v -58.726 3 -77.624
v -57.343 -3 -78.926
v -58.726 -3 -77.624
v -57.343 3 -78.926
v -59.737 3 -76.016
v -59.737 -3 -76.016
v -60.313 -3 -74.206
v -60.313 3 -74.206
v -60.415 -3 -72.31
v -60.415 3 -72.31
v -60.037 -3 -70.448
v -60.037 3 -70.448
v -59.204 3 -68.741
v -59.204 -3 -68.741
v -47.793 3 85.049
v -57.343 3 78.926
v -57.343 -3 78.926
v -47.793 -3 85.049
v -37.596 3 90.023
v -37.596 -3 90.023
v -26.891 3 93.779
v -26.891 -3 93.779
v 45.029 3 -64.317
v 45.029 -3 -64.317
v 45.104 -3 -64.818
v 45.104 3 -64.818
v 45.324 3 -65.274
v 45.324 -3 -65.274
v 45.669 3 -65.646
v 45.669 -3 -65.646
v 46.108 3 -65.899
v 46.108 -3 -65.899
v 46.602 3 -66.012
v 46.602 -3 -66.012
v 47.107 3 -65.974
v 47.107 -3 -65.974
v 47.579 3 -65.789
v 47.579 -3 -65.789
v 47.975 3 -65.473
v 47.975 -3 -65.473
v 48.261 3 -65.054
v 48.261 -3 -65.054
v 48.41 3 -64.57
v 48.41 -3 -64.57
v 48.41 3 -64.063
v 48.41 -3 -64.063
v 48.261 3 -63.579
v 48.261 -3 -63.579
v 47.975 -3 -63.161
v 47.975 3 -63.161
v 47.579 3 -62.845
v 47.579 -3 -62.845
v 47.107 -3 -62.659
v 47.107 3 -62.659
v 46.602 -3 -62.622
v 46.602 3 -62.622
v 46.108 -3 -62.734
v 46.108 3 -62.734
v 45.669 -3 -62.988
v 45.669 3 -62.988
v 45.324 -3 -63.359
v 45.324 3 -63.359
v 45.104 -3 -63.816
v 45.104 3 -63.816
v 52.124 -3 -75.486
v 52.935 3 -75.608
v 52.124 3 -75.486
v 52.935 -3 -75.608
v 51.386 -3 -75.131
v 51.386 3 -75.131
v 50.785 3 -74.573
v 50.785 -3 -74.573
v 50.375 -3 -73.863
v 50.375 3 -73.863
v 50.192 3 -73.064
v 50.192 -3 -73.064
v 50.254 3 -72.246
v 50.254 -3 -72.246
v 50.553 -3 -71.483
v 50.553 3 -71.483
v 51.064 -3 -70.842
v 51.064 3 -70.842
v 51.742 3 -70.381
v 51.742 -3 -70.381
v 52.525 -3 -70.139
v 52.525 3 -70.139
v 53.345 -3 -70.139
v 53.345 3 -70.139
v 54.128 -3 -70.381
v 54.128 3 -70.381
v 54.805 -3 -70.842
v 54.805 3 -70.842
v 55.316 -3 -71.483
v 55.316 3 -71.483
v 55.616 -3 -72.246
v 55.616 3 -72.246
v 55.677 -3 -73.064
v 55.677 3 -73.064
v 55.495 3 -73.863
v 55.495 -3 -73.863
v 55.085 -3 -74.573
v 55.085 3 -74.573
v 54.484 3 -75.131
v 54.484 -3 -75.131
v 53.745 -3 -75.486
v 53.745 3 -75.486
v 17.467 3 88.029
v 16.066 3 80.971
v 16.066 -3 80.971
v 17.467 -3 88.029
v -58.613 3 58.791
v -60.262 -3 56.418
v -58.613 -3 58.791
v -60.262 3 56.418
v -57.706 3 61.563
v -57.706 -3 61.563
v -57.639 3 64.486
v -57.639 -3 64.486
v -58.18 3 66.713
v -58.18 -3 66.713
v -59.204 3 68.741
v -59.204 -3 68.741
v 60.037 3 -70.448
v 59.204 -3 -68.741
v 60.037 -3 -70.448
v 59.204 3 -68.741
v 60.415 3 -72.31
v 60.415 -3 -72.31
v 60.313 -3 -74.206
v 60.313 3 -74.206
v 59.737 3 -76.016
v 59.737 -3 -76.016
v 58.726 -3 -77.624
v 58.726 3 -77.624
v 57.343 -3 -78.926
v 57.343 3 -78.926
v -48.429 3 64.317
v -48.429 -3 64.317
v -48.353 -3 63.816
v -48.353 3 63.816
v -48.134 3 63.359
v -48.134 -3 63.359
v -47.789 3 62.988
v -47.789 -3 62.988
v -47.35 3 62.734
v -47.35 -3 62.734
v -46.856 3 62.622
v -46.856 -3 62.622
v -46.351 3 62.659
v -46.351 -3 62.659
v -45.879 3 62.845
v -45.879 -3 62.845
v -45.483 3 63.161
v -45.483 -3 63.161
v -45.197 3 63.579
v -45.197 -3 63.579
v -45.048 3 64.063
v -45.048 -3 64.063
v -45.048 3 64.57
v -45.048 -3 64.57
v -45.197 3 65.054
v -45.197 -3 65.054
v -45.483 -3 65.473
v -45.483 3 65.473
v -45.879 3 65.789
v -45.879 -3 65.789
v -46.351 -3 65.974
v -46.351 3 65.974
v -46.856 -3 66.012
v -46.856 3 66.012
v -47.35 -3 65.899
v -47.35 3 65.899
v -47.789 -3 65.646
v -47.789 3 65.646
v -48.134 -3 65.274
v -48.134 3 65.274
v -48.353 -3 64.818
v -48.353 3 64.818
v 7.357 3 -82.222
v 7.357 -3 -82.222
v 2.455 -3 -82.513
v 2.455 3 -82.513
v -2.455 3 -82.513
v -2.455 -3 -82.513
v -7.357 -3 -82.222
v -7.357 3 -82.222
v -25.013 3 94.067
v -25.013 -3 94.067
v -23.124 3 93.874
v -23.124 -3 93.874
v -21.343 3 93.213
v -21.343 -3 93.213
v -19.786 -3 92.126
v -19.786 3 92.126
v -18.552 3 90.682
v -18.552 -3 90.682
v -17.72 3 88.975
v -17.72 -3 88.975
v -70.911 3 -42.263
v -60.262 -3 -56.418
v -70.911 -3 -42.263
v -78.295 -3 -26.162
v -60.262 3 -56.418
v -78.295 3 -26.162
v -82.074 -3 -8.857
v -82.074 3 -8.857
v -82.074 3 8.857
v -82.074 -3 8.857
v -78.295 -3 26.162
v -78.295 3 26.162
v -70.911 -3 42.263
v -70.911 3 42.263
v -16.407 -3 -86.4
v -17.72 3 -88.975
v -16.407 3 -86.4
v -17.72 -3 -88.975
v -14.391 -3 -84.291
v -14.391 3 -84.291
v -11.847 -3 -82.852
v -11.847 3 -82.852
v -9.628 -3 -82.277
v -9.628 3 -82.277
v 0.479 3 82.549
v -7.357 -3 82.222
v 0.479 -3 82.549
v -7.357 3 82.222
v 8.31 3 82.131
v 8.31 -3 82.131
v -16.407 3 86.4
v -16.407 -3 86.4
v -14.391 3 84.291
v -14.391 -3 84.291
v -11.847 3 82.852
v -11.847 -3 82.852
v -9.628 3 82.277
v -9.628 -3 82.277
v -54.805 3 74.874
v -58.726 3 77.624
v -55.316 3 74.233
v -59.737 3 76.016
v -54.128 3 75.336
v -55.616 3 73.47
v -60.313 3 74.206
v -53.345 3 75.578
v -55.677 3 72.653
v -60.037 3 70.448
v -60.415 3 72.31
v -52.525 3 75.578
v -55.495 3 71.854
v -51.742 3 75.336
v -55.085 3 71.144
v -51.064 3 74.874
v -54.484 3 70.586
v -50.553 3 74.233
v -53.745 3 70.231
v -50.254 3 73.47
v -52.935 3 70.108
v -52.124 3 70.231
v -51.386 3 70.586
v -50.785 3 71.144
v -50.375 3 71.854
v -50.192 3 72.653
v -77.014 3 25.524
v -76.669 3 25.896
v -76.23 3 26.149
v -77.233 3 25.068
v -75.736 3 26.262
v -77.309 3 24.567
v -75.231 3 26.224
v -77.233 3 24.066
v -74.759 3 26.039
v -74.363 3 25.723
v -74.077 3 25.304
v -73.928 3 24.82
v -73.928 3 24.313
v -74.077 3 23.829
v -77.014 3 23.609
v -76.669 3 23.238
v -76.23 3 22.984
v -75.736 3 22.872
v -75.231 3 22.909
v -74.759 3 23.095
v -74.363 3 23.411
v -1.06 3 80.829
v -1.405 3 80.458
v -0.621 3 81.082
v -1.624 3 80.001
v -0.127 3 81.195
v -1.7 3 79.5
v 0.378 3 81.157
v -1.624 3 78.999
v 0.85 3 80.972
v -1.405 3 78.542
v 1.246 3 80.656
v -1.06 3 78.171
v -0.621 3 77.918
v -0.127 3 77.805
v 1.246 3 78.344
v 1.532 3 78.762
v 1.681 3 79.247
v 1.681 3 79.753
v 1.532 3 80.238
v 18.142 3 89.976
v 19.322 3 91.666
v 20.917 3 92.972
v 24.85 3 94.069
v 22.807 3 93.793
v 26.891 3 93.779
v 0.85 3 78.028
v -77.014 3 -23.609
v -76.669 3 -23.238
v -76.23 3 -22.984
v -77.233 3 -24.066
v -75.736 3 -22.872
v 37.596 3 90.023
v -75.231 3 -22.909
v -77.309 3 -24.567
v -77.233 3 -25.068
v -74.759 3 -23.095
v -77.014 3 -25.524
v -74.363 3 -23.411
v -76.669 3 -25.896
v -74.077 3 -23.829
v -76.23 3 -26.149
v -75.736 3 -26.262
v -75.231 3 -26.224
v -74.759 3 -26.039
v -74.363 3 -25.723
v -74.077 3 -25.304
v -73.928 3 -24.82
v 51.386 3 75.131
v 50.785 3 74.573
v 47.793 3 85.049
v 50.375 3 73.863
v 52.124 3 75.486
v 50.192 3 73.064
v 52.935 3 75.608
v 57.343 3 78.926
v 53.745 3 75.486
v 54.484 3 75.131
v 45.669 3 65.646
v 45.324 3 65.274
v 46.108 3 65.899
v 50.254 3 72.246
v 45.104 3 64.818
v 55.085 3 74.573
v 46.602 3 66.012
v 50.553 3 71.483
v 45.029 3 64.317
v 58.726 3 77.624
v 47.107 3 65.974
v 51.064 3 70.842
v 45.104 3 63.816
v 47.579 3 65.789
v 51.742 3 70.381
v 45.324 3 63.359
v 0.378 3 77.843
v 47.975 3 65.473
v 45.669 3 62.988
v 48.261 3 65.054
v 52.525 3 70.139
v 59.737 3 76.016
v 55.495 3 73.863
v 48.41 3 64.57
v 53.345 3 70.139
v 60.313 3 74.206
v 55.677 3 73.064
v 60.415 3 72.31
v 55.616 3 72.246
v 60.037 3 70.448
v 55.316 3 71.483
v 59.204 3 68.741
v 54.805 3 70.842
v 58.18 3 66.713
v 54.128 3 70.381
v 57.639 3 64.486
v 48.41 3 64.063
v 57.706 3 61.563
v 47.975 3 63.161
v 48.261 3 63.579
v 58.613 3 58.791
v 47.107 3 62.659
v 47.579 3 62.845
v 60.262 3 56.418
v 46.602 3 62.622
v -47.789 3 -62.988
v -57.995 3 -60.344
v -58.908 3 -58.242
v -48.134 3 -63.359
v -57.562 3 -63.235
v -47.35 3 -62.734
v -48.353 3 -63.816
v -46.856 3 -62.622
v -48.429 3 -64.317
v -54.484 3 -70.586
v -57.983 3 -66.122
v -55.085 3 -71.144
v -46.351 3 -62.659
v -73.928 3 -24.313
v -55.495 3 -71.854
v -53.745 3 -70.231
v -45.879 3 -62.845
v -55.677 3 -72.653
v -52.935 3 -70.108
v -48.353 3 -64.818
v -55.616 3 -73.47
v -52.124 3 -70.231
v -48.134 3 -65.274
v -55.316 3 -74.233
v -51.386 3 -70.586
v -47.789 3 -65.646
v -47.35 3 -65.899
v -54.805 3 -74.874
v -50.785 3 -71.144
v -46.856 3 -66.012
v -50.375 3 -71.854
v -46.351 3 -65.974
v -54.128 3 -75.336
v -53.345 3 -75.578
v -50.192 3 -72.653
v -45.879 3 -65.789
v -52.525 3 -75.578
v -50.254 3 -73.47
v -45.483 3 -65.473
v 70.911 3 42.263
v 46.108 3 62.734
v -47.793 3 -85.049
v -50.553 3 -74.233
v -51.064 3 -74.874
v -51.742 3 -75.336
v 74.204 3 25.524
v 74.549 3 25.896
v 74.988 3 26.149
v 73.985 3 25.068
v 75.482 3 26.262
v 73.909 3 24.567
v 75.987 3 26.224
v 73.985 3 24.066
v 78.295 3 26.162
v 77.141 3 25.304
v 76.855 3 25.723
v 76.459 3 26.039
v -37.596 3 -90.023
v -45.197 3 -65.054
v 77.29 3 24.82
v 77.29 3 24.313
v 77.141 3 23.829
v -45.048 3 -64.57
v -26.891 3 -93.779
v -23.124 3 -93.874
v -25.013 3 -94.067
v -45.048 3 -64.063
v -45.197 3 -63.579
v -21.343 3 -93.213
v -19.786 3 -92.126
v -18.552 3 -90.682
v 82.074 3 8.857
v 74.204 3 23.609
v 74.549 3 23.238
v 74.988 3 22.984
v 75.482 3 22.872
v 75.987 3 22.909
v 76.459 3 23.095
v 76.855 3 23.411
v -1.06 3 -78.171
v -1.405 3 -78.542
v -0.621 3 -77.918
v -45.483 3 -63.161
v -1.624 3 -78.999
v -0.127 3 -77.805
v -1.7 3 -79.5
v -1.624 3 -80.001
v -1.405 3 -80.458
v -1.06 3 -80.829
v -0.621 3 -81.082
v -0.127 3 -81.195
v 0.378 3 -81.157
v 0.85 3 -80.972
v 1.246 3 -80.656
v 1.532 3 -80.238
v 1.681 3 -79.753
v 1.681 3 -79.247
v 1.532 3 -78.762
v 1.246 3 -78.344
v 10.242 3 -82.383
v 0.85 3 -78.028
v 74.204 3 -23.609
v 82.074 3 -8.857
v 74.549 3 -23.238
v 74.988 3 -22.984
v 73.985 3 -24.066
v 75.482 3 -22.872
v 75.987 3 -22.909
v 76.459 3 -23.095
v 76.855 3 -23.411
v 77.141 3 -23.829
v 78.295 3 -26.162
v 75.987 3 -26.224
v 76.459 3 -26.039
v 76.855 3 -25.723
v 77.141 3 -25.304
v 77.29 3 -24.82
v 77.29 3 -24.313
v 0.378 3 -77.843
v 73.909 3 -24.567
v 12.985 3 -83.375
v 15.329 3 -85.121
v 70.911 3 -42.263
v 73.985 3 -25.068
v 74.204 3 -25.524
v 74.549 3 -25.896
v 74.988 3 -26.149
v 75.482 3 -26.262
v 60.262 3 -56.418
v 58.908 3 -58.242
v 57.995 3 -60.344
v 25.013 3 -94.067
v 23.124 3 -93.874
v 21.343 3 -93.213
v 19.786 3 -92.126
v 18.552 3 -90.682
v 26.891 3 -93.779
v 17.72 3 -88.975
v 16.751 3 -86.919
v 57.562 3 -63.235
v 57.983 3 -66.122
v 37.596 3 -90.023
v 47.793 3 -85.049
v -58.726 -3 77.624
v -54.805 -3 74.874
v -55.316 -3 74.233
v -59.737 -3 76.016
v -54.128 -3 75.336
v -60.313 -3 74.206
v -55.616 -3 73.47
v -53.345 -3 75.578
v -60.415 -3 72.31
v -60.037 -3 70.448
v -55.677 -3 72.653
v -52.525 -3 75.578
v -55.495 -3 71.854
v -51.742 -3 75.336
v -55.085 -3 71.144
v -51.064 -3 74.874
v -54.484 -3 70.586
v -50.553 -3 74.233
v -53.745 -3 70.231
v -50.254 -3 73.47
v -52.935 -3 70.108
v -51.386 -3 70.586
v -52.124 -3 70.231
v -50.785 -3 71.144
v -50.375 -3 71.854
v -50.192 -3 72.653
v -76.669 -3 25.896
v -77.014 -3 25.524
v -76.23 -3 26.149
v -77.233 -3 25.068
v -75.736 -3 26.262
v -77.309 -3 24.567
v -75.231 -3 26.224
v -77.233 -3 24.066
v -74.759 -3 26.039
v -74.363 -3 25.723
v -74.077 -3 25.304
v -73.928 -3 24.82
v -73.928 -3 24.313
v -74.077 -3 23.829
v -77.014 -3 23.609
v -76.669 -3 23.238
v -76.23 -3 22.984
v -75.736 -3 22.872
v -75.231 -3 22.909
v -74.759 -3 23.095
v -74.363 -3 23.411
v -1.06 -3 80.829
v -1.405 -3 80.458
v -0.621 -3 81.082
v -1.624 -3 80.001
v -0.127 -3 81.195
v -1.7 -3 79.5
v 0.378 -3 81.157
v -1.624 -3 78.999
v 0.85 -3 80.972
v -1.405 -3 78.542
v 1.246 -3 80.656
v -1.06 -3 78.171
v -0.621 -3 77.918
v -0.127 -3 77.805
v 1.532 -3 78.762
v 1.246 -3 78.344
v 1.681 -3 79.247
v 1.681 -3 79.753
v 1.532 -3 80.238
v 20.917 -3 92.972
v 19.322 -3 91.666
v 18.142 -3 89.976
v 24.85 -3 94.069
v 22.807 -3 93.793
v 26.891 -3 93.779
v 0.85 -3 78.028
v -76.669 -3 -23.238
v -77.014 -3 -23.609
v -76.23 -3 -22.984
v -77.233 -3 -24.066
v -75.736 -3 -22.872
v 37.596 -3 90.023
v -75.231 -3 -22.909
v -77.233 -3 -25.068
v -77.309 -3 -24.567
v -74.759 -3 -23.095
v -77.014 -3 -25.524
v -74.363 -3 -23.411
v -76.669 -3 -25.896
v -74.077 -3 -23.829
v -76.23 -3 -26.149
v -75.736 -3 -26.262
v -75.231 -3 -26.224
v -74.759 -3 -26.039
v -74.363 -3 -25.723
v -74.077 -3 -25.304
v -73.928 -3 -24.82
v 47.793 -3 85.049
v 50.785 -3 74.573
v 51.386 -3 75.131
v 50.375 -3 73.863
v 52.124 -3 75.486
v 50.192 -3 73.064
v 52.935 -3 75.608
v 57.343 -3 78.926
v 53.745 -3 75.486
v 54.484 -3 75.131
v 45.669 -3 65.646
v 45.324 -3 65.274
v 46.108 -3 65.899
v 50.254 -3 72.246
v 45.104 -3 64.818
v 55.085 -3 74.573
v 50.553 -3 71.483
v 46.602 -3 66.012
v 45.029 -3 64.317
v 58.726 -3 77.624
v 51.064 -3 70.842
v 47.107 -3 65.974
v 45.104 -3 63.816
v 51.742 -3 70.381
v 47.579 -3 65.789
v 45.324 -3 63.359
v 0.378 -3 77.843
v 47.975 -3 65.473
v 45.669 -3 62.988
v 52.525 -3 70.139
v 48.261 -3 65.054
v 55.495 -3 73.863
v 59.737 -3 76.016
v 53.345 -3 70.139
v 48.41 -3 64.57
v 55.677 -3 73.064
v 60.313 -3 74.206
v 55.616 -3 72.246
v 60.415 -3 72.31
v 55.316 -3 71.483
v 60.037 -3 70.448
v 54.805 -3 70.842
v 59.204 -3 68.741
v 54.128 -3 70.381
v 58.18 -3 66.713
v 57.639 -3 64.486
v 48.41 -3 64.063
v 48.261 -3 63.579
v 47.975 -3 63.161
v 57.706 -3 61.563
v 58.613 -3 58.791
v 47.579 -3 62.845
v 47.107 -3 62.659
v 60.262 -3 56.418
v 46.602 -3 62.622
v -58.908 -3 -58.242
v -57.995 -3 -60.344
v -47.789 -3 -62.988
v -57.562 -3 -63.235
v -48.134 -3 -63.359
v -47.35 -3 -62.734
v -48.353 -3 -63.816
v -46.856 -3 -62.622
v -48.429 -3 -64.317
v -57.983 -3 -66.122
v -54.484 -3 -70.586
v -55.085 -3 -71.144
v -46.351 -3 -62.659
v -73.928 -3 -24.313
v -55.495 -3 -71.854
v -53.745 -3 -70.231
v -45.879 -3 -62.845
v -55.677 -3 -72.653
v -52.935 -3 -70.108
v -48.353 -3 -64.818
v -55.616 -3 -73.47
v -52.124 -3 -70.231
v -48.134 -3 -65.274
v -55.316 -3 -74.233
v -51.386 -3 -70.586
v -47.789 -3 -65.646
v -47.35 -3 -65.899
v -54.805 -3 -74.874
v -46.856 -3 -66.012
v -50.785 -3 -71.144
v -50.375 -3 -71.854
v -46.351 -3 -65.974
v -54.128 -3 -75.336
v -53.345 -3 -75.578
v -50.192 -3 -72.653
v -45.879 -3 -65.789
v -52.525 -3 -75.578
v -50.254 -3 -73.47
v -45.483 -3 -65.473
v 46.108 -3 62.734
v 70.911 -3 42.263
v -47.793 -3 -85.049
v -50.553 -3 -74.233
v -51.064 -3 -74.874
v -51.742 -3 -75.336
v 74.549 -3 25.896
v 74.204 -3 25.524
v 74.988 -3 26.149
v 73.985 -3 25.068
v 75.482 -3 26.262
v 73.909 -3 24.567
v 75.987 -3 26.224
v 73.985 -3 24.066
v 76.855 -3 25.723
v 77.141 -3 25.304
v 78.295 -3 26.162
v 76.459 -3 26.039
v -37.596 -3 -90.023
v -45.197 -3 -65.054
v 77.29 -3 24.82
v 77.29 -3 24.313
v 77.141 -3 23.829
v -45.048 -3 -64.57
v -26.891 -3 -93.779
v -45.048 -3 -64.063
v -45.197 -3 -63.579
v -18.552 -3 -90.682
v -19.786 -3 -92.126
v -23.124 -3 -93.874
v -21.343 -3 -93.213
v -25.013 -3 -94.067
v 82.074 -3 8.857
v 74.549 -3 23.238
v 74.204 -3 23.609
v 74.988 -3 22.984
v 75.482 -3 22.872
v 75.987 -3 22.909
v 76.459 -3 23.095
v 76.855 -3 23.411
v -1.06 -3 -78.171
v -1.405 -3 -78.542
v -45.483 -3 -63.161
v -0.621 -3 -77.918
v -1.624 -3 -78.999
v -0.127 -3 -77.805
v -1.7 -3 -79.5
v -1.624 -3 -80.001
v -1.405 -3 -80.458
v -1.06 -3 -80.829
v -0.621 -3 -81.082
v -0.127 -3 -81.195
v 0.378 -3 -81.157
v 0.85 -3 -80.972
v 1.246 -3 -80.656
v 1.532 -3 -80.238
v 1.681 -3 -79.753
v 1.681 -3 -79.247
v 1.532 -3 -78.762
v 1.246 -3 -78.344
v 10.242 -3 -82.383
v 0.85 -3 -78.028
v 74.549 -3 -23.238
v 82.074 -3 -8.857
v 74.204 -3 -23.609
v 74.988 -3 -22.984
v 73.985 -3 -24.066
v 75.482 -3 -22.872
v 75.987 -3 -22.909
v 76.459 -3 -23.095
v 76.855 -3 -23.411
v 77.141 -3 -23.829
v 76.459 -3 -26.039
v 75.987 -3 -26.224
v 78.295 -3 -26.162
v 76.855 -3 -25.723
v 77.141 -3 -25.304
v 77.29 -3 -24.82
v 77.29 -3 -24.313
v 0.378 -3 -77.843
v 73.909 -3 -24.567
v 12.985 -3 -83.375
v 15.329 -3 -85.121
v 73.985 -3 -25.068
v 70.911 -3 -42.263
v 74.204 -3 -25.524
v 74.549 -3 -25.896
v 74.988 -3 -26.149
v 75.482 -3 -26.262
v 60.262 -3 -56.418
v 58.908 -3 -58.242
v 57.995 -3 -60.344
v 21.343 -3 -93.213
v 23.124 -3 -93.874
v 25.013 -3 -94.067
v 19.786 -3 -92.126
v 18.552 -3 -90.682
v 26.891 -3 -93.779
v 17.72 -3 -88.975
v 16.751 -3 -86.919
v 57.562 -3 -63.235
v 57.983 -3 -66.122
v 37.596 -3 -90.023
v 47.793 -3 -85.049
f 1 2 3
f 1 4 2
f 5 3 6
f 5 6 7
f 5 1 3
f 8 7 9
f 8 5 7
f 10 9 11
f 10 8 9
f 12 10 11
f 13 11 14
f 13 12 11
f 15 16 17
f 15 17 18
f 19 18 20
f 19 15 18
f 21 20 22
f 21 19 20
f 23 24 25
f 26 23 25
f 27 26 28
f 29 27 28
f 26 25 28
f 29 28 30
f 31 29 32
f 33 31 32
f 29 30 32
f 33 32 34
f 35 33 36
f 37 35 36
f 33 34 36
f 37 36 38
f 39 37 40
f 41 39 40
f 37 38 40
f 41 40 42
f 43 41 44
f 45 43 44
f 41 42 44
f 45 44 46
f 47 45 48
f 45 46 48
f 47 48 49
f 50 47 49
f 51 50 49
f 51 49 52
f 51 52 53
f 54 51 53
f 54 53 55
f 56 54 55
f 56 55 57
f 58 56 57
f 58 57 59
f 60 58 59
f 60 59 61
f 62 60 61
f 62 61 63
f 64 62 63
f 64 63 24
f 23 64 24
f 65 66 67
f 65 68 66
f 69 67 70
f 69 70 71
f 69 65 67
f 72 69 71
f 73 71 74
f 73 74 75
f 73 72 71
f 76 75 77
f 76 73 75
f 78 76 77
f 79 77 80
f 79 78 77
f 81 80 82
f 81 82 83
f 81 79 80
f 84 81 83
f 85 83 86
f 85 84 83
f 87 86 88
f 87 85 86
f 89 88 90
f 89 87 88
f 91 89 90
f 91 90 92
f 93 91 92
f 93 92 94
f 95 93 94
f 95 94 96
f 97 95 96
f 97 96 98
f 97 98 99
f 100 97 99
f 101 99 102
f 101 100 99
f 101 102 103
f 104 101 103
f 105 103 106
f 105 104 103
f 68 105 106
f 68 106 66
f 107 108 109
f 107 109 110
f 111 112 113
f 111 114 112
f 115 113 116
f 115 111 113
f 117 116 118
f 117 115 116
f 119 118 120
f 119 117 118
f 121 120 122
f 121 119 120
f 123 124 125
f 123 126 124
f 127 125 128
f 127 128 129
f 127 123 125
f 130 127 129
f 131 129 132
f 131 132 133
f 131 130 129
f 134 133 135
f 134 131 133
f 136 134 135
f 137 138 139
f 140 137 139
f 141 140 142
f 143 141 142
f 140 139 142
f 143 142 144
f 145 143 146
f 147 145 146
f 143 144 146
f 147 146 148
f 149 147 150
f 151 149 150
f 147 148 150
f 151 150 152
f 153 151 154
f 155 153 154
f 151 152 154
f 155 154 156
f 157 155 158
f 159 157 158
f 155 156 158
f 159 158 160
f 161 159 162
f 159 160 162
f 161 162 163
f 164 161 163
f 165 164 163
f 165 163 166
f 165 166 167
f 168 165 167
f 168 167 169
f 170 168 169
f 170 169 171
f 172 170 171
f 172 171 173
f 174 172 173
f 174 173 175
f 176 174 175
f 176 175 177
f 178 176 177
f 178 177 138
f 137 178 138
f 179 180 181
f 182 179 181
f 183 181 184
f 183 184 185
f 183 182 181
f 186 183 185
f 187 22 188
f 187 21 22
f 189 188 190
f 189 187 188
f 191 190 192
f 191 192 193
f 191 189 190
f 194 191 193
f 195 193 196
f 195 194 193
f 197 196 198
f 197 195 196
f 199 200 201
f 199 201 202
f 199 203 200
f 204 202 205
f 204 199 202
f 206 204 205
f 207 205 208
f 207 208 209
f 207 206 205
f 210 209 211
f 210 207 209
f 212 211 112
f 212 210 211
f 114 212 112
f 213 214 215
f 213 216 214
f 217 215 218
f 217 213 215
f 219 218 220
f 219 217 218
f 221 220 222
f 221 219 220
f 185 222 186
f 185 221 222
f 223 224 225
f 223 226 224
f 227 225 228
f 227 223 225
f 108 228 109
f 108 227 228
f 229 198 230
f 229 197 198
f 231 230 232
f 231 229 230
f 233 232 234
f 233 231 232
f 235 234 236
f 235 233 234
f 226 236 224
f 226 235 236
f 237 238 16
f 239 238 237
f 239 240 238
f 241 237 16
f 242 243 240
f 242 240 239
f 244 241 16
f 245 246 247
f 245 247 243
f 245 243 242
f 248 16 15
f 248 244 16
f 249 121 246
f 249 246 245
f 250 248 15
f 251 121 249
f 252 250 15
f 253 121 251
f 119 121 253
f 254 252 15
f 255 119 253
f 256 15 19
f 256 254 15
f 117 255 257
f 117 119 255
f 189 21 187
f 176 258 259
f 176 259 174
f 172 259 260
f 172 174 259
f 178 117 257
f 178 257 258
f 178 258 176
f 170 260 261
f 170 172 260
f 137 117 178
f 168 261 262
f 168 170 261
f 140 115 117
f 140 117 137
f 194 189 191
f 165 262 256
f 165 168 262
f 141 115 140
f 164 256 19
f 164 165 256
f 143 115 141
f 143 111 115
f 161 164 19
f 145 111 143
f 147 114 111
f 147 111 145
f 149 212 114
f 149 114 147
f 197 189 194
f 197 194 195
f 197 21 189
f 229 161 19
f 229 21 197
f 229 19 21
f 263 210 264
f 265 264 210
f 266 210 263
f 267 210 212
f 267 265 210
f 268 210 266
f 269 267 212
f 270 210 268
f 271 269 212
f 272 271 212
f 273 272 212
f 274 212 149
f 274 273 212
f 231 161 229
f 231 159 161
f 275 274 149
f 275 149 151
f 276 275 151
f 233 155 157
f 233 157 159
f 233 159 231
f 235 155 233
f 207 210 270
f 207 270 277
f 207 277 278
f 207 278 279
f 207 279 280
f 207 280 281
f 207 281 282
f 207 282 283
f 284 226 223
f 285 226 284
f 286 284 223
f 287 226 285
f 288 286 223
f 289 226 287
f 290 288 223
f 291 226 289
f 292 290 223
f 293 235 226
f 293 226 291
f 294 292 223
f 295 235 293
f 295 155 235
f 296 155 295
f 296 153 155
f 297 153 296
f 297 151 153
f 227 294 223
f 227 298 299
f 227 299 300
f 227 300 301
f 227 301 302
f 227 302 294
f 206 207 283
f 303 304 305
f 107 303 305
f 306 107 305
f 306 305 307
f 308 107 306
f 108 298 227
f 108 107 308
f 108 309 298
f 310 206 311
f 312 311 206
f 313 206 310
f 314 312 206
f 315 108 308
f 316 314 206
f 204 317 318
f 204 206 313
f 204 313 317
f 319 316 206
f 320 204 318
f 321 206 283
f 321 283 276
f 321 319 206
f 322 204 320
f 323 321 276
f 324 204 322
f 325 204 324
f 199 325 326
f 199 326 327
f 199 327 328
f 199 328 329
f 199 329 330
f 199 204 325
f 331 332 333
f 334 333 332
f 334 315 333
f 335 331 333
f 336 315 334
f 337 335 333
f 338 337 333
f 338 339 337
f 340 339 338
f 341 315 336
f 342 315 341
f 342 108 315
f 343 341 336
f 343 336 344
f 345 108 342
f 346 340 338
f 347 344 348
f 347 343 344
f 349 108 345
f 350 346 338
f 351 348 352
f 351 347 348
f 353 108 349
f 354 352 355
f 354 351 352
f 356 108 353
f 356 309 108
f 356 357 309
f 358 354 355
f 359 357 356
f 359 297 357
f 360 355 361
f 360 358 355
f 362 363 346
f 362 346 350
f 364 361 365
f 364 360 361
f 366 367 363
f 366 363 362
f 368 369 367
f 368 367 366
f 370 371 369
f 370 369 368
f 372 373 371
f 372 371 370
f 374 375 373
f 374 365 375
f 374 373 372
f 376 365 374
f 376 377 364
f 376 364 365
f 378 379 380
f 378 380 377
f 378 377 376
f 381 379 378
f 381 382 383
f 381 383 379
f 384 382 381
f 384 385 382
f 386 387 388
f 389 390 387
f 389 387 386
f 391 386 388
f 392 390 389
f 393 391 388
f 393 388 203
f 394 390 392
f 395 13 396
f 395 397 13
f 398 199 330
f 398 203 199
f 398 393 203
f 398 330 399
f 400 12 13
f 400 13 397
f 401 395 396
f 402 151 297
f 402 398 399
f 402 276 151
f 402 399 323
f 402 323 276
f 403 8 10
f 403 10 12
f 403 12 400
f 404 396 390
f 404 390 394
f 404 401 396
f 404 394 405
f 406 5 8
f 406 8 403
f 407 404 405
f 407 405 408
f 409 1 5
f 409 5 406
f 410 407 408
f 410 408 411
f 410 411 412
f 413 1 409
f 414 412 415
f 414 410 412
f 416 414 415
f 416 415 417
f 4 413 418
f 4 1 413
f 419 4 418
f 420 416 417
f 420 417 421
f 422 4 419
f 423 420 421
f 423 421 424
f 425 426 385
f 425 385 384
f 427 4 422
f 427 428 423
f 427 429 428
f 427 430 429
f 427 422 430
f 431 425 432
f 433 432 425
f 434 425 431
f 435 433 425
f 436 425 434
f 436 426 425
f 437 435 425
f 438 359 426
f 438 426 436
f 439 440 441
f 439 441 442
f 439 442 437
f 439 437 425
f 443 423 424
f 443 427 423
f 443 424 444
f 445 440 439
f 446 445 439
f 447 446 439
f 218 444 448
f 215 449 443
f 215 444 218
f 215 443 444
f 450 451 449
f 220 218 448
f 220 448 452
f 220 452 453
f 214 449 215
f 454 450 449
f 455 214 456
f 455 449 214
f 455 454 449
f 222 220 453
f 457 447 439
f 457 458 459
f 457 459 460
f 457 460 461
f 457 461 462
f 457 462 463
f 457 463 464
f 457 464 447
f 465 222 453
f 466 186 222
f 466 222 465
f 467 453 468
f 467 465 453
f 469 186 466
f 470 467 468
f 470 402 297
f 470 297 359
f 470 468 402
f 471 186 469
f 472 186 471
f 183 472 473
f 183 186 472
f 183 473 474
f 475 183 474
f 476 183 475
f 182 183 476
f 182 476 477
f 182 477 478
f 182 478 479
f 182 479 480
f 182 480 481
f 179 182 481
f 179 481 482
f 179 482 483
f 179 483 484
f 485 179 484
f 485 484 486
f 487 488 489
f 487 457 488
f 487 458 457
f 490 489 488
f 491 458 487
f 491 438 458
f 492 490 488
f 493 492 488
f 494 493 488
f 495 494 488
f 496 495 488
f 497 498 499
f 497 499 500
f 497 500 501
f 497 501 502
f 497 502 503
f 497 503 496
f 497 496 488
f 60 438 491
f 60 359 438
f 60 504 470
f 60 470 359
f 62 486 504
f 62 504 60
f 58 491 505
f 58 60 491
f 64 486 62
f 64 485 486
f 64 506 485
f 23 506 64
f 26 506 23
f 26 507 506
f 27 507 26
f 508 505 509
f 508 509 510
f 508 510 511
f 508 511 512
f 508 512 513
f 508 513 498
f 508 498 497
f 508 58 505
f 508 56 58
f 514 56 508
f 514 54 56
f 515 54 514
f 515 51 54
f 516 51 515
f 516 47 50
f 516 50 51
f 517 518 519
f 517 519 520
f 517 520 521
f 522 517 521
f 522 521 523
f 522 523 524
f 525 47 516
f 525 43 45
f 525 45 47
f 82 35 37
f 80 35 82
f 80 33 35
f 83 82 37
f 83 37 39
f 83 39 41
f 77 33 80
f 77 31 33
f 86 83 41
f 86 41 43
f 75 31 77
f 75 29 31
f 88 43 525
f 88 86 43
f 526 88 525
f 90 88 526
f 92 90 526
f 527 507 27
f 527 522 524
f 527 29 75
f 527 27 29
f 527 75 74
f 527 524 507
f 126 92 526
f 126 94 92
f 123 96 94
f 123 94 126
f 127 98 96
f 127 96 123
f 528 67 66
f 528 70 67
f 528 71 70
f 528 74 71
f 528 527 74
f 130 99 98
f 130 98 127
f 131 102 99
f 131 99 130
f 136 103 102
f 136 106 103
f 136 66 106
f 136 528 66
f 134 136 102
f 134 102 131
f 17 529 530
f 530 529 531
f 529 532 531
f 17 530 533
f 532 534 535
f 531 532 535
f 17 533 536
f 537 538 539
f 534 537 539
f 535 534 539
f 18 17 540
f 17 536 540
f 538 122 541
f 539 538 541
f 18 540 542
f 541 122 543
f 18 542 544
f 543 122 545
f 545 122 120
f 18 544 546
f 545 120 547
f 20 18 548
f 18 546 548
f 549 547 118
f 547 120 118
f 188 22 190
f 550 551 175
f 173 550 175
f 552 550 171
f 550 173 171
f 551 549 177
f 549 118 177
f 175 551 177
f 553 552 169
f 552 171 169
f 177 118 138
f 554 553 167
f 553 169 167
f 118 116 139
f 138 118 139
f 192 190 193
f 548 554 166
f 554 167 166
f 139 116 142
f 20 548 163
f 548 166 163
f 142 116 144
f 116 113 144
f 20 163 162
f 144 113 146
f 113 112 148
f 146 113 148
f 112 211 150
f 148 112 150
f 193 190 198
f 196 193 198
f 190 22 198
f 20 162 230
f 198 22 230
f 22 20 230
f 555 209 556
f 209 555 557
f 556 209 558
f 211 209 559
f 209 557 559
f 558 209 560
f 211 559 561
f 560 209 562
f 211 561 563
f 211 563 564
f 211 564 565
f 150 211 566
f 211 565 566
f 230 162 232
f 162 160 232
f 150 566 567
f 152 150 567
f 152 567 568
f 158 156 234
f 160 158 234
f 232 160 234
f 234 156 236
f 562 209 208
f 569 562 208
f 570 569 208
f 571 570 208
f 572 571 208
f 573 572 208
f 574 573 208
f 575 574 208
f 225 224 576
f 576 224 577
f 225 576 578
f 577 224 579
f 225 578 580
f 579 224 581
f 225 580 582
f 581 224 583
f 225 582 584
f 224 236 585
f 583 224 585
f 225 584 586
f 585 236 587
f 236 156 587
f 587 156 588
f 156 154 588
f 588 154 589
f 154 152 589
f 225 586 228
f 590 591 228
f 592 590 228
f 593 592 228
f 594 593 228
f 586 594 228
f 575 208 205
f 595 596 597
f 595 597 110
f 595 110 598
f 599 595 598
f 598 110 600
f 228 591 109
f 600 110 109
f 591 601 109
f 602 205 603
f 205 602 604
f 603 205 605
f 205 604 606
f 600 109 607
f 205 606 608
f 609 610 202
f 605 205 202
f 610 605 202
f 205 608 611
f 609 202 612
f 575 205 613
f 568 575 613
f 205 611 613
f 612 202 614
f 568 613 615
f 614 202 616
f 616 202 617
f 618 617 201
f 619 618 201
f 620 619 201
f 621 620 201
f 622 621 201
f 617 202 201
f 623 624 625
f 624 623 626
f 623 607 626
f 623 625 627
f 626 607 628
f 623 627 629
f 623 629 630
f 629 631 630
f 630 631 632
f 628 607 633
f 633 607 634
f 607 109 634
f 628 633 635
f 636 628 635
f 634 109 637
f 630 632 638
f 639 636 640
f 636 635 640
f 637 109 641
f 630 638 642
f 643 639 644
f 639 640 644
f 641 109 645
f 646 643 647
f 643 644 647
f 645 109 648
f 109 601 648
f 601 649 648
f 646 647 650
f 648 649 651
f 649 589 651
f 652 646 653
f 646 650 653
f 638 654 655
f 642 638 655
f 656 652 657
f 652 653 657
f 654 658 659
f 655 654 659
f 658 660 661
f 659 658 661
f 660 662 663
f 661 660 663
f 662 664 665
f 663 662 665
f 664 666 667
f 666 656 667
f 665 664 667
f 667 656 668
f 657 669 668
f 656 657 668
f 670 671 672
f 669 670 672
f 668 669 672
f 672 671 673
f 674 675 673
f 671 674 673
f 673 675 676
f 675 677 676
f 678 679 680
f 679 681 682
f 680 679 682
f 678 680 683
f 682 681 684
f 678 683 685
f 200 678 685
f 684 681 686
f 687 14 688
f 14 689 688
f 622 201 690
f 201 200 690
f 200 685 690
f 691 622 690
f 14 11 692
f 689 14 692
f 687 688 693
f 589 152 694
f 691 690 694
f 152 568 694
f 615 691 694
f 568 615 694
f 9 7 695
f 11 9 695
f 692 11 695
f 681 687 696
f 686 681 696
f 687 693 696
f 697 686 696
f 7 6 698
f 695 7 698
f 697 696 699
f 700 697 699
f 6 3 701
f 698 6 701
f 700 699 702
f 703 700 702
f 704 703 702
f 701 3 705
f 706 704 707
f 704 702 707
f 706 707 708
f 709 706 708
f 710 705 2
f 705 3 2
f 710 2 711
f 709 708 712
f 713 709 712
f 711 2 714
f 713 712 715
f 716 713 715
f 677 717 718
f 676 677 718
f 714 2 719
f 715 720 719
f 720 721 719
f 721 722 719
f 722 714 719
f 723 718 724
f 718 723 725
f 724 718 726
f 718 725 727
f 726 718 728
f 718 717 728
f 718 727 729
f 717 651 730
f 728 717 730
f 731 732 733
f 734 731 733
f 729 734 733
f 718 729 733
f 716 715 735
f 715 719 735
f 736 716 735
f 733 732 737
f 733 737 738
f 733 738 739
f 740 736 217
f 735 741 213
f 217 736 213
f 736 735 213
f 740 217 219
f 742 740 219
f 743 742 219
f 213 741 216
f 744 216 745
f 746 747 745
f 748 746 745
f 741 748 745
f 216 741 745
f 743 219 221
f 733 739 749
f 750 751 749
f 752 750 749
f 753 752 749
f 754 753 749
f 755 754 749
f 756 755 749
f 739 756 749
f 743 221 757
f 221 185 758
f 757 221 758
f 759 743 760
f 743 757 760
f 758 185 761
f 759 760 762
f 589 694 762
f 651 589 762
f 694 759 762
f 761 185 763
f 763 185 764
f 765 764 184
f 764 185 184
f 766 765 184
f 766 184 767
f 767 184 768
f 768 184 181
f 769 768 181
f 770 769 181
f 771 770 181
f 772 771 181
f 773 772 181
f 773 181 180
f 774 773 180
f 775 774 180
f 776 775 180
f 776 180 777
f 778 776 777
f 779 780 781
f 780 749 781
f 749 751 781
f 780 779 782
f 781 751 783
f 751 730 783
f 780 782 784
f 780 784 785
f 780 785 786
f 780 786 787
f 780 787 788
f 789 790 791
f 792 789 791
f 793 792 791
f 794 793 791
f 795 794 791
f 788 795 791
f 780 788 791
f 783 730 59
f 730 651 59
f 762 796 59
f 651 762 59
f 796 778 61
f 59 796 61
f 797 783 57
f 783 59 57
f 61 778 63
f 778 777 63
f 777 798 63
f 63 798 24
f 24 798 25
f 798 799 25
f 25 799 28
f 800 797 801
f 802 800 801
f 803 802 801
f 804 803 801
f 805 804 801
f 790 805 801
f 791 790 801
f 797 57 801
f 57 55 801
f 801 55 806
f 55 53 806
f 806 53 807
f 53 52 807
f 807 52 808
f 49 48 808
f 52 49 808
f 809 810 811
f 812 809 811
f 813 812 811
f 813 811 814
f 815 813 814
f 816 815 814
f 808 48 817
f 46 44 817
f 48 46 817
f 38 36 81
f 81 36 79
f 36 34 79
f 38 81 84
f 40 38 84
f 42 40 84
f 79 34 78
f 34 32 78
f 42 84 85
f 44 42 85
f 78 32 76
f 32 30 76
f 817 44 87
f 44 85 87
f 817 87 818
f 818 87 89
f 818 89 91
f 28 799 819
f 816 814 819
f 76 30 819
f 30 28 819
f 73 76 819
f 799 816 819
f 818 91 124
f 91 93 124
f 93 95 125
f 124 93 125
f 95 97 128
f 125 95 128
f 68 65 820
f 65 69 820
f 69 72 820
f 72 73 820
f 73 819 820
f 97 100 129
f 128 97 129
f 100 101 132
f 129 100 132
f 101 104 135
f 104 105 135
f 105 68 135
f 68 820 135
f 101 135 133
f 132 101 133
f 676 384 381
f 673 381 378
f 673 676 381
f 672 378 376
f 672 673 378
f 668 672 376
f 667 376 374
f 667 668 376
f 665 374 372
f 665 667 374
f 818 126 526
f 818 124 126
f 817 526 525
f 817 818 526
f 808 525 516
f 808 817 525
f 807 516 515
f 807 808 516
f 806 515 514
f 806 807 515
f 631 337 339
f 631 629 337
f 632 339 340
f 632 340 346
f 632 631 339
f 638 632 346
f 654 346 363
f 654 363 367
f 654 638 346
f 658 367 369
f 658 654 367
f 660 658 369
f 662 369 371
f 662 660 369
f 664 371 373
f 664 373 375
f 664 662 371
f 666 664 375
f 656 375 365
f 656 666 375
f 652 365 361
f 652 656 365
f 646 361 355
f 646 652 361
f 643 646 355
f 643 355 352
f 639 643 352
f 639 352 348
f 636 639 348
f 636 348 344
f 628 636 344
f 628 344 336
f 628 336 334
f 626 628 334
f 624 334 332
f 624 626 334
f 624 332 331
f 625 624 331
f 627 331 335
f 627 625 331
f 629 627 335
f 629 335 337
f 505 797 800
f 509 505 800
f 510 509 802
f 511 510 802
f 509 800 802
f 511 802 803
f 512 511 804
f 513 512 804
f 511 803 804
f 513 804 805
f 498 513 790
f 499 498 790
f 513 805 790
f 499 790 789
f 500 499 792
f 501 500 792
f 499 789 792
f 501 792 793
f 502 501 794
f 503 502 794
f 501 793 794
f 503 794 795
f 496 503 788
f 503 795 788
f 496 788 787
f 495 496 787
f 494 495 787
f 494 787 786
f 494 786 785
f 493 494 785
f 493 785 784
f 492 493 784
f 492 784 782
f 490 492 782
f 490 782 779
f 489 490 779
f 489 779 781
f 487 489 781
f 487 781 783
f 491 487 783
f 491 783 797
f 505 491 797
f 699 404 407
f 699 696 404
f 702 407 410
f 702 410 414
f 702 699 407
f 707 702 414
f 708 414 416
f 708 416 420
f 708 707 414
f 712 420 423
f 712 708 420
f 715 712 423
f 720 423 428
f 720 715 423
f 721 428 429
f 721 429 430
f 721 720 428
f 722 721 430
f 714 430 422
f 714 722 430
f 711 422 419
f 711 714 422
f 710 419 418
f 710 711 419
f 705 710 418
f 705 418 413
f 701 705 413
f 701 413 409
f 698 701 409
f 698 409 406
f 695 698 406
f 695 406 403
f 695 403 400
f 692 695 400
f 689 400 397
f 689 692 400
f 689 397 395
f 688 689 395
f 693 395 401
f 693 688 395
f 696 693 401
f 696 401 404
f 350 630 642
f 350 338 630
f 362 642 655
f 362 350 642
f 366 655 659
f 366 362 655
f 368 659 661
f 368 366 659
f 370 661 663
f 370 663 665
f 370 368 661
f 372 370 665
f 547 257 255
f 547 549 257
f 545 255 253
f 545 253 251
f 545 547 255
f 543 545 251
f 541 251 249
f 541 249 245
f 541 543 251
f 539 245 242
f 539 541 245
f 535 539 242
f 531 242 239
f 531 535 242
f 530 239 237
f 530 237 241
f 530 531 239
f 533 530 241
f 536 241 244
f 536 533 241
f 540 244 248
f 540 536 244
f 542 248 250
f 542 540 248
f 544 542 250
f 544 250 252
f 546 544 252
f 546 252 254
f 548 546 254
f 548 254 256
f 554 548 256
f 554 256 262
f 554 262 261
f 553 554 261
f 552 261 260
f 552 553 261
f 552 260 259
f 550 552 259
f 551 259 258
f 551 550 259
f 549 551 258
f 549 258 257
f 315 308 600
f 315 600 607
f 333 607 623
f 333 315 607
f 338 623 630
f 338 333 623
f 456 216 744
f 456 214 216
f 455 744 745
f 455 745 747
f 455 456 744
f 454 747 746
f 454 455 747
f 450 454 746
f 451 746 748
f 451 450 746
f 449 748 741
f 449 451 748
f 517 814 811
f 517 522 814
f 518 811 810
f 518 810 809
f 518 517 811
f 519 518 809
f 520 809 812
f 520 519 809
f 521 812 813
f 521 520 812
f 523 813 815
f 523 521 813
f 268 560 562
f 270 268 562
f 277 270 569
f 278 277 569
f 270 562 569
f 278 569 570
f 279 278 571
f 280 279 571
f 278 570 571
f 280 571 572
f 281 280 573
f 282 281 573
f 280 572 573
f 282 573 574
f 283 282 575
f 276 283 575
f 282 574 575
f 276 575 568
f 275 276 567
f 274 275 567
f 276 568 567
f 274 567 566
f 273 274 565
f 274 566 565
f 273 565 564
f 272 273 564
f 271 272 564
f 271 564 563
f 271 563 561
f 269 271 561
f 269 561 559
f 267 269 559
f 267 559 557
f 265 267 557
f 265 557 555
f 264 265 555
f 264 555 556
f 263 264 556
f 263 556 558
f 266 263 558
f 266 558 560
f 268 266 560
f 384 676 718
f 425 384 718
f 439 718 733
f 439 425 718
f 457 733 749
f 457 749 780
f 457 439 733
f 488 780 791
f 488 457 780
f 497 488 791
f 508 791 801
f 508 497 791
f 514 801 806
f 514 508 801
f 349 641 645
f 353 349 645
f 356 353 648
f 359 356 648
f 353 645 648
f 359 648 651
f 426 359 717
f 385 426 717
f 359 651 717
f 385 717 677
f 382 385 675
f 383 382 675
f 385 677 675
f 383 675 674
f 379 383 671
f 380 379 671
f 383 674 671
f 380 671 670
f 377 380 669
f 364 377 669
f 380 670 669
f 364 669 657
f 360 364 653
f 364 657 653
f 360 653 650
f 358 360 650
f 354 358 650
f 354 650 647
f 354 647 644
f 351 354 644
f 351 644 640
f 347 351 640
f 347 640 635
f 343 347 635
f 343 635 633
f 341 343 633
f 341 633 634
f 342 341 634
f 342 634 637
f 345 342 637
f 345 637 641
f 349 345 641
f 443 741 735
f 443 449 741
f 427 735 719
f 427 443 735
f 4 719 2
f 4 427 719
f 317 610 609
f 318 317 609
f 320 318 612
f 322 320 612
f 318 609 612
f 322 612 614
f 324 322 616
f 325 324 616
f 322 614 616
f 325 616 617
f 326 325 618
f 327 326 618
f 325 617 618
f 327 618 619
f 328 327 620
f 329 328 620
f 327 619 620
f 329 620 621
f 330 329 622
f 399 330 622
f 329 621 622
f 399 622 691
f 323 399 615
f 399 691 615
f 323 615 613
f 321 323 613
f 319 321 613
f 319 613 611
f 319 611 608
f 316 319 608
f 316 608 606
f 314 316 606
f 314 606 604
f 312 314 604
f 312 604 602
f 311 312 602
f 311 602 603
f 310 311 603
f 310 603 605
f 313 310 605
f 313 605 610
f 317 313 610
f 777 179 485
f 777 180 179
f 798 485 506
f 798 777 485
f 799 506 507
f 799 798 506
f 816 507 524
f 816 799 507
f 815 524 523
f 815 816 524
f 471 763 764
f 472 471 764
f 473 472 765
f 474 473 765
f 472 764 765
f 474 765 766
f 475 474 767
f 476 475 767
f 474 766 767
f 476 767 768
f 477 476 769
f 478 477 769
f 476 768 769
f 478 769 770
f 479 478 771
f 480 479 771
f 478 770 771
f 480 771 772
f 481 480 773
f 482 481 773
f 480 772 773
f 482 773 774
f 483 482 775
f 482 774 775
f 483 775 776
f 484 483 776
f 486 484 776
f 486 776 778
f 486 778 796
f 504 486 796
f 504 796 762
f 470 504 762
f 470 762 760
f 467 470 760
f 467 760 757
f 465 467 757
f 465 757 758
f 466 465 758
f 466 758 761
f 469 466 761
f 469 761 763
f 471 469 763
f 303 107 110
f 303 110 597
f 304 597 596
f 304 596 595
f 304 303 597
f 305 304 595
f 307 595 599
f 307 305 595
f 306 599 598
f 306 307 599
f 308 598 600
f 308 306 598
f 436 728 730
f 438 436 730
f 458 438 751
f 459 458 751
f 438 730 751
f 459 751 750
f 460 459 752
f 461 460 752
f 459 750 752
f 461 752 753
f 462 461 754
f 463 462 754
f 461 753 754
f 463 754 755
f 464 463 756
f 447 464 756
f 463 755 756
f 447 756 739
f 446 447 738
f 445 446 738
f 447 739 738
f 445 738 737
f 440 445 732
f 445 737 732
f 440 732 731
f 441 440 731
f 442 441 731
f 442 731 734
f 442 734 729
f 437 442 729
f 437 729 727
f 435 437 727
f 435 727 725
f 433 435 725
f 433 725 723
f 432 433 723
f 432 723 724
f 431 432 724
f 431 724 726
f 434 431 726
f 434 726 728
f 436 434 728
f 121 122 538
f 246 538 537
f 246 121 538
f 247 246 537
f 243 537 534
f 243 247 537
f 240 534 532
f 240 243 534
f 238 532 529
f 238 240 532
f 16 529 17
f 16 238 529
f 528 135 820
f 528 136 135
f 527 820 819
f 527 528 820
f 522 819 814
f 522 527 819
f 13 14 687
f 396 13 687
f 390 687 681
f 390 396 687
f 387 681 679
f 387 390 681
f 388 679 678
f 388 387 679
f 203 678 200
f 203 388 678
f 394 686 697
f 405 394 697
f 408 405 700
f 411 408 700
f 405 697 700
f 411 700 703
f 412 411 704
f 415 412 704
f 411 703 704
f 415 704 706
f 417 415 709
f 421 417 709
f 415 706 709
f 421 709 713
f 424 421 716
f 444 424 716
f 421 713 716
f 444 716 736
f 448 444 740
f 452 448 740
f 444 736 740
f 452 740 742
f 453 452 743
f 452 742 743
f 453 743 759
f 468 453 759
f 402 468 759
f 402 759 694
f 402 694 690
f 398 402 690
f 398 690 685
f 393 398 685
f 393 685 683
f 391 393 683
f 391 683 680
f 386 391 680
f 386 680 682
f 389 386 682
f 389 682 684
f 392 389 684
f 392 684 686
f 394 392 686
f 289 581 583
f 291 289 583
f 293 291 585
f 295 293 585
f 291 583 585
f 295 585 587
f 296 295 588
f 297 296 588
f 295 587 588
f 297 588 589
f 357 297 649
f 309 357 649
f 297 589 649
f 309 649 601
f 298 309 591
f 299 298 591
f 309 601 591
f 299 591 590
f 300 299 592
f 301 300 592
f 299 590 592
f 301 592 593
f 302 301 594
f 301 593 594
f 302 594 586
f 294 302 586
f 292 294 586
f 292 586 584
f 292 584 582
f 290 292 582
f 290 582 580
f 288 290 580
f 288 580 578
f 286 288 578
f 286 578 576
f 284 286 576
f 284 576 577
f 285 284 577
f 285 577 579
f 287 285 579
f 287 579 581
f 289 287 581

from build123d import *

# Parameters (mm, degrees)
SKETCH1_R            = 2.75
BOSS_EXTRUDE1_DEPTH  = 3
M3_CLEARANCE_HOLE1_D = 3.4
FILLET2_R            = 10


with BuildPart() as part:
    # Sketch1 → Boss-Extrude1 (new, symmetric)
    with BuildSketch(Plane(origin=(0, 0, 0), x_dir=(1, 0, 0), z_dir=(0, 1, 0))):
        with BuildLine():
            Line((-58.614111744, 67.959966353), (-53.914904373, 62.511483636))
            ThreePointArc((-53.914904373, 62.511483636), (-82.55, 0), (-53.914904373, -62.511483636))
            Line((-53.914904373, -62.511483636), (-58.614111744, -67.959966353))
            ThreePointArc((-58.614111744, -67.959966353), (-60.384815089, -73.721869234), (-57.34308106, -78.925980035))
            ThreePointArc((-57.34308106, -78.925980035), (-42.766558206, -87.684438581), (-26.890595122, -93.77864983))
            ThreePointArc((-26.890595122, -93.77864983), (-20.917021387, -92.971598421), (-17.46673379, -88.028883515))
            Line((-17.46673379, -88.028883515), (-16.066391761, -80.971436666))
            ThreePointArc((-16.066391761, -80.971436666), (0, -82.55), (16.066391761, -80.971436666))
            Line((16.066391761, -80.971436666), (17.46673379, -88.028883515))
            ThreePointArc((17.46673379, -88.028883515), (20.917021387, -92.971598421), (26.890595122, -93.77864983))
            ThreePointArc((26.890595122, -93.77864983), (42.766558206, -87.684438581), (57.34308106, -78.925980035))
            ThreePointArc((57.34308106, -78.925980035), (60.384815089, -73.721869234), (58.614111744, -67.959966353))
            Line((58.614111744, -67.959966353), (53.914904373, -62.511483636))
            ThreePointArc((53.914904373, -62.511483636), (82.55, 0), (53.914904373, 62.511483636))
            Line((53.914904373, 62.511483636), (58.614111744, 67.959966353))
            ThreePointArc((58.614111744, 67.959966353), (60.384815089, 73.721869234), (57.34308106, 78.925980035))
            ThreePointArc((57.34308106, 78.925980035), (42.766558206, 87.684438581), (26.890595122, 93.77864983))
            ThreePointArc((26.890595122, 93.77864983), (20.917021387, 92.971598421), (17.46673379, 88.028883515))
            Line((17.46673379, 88.028883515), (16.066391761, 80.971436666))
            ThreePointArc((16.066391761, 80.971436666), (0, 82.55), (-16.066391761, 80.971436666))
            Line((-16.066391761, 80.971436666), (-17.46673379, 88.028883515))
            ThreePointArc((-17.46673379, 88.028883515), (-20.917021387, 92.971598421), (-26.890595122, 93.77864983))
            ThreePointArc((-26.890595122, 93.77864983), (-42.766558206, 87.684438581), (-57.34308106, 78.925980035))
            ThreePointArc((-57.34308106, 78.925980035), (-60.384815089, 73.721869234), (-58.614111744, 67.959966353))
        make_face()
        with Locations(Location((52.934691668, -72.858352577, 0), (0, 0, 270))):
            Circle(SKETCH1_R, mode=Mode.SUBTRACT)
        with Locations(Location((52.934691668, 72.858352577, 0), (0, 0, 90))):
            Circle(SKETCH1_R, mode=Mode.SUBTRACT)
        with Locations(Location((-52.934691668, -72.858352577, 0), (0, 0, 90))):
            Circle(SKETCH1_R, mode=Mode.SUBTRACT)
        with Locations(Location((-52.934691668, 72.858352577, 0), (0, 0, 270))):
            Circle(SKETCH1_R, mode=Mode.SUBTRACT)
    extrude(amount=BOSS_EXTRUDE1_DEPTH, both=True)

    # M3 Clearance Hole1 (through all)
    with Locations(Plane(origin=(0, 3, 0), x_dir=(1, 0, 0), z_dir=(0, 1, 0))):
        with Locations((0, 79.5), (46.728927557, 64.316851053), (75.608993045, 24.566851053), (75.608993045, -24.566851053), (46.728927557, -64.316851053), (0, -79.5), (-46.728927557, -64.316851053), (-75.608993045, -24.566851053), (-75.608993045, 24.566851053), (-46.728927557, 64.316851053)):
            Hole(M3_CLEARANCE_HOLE1_D / 2)

    # Fillet2
    fillet2_edges = [part.edges().sort_by_distance(p)[0] for p in [
        (-53.914904373, 0, 62.511483636),
        (-53.914904373, 0, -62.511483636),
        (-16.066391761, 0, 80.971436666),
        (53.914904373, 0, 62.511483636),
        (53.914904373, 0, -62.511483636),
        (16.066391761, 0, -80.971436666),
        (-16.066391761, 0, -80.971436666),
    ]]
    fillet(fillet2_edges, radius=FILLET2_R)


solid = part.part
